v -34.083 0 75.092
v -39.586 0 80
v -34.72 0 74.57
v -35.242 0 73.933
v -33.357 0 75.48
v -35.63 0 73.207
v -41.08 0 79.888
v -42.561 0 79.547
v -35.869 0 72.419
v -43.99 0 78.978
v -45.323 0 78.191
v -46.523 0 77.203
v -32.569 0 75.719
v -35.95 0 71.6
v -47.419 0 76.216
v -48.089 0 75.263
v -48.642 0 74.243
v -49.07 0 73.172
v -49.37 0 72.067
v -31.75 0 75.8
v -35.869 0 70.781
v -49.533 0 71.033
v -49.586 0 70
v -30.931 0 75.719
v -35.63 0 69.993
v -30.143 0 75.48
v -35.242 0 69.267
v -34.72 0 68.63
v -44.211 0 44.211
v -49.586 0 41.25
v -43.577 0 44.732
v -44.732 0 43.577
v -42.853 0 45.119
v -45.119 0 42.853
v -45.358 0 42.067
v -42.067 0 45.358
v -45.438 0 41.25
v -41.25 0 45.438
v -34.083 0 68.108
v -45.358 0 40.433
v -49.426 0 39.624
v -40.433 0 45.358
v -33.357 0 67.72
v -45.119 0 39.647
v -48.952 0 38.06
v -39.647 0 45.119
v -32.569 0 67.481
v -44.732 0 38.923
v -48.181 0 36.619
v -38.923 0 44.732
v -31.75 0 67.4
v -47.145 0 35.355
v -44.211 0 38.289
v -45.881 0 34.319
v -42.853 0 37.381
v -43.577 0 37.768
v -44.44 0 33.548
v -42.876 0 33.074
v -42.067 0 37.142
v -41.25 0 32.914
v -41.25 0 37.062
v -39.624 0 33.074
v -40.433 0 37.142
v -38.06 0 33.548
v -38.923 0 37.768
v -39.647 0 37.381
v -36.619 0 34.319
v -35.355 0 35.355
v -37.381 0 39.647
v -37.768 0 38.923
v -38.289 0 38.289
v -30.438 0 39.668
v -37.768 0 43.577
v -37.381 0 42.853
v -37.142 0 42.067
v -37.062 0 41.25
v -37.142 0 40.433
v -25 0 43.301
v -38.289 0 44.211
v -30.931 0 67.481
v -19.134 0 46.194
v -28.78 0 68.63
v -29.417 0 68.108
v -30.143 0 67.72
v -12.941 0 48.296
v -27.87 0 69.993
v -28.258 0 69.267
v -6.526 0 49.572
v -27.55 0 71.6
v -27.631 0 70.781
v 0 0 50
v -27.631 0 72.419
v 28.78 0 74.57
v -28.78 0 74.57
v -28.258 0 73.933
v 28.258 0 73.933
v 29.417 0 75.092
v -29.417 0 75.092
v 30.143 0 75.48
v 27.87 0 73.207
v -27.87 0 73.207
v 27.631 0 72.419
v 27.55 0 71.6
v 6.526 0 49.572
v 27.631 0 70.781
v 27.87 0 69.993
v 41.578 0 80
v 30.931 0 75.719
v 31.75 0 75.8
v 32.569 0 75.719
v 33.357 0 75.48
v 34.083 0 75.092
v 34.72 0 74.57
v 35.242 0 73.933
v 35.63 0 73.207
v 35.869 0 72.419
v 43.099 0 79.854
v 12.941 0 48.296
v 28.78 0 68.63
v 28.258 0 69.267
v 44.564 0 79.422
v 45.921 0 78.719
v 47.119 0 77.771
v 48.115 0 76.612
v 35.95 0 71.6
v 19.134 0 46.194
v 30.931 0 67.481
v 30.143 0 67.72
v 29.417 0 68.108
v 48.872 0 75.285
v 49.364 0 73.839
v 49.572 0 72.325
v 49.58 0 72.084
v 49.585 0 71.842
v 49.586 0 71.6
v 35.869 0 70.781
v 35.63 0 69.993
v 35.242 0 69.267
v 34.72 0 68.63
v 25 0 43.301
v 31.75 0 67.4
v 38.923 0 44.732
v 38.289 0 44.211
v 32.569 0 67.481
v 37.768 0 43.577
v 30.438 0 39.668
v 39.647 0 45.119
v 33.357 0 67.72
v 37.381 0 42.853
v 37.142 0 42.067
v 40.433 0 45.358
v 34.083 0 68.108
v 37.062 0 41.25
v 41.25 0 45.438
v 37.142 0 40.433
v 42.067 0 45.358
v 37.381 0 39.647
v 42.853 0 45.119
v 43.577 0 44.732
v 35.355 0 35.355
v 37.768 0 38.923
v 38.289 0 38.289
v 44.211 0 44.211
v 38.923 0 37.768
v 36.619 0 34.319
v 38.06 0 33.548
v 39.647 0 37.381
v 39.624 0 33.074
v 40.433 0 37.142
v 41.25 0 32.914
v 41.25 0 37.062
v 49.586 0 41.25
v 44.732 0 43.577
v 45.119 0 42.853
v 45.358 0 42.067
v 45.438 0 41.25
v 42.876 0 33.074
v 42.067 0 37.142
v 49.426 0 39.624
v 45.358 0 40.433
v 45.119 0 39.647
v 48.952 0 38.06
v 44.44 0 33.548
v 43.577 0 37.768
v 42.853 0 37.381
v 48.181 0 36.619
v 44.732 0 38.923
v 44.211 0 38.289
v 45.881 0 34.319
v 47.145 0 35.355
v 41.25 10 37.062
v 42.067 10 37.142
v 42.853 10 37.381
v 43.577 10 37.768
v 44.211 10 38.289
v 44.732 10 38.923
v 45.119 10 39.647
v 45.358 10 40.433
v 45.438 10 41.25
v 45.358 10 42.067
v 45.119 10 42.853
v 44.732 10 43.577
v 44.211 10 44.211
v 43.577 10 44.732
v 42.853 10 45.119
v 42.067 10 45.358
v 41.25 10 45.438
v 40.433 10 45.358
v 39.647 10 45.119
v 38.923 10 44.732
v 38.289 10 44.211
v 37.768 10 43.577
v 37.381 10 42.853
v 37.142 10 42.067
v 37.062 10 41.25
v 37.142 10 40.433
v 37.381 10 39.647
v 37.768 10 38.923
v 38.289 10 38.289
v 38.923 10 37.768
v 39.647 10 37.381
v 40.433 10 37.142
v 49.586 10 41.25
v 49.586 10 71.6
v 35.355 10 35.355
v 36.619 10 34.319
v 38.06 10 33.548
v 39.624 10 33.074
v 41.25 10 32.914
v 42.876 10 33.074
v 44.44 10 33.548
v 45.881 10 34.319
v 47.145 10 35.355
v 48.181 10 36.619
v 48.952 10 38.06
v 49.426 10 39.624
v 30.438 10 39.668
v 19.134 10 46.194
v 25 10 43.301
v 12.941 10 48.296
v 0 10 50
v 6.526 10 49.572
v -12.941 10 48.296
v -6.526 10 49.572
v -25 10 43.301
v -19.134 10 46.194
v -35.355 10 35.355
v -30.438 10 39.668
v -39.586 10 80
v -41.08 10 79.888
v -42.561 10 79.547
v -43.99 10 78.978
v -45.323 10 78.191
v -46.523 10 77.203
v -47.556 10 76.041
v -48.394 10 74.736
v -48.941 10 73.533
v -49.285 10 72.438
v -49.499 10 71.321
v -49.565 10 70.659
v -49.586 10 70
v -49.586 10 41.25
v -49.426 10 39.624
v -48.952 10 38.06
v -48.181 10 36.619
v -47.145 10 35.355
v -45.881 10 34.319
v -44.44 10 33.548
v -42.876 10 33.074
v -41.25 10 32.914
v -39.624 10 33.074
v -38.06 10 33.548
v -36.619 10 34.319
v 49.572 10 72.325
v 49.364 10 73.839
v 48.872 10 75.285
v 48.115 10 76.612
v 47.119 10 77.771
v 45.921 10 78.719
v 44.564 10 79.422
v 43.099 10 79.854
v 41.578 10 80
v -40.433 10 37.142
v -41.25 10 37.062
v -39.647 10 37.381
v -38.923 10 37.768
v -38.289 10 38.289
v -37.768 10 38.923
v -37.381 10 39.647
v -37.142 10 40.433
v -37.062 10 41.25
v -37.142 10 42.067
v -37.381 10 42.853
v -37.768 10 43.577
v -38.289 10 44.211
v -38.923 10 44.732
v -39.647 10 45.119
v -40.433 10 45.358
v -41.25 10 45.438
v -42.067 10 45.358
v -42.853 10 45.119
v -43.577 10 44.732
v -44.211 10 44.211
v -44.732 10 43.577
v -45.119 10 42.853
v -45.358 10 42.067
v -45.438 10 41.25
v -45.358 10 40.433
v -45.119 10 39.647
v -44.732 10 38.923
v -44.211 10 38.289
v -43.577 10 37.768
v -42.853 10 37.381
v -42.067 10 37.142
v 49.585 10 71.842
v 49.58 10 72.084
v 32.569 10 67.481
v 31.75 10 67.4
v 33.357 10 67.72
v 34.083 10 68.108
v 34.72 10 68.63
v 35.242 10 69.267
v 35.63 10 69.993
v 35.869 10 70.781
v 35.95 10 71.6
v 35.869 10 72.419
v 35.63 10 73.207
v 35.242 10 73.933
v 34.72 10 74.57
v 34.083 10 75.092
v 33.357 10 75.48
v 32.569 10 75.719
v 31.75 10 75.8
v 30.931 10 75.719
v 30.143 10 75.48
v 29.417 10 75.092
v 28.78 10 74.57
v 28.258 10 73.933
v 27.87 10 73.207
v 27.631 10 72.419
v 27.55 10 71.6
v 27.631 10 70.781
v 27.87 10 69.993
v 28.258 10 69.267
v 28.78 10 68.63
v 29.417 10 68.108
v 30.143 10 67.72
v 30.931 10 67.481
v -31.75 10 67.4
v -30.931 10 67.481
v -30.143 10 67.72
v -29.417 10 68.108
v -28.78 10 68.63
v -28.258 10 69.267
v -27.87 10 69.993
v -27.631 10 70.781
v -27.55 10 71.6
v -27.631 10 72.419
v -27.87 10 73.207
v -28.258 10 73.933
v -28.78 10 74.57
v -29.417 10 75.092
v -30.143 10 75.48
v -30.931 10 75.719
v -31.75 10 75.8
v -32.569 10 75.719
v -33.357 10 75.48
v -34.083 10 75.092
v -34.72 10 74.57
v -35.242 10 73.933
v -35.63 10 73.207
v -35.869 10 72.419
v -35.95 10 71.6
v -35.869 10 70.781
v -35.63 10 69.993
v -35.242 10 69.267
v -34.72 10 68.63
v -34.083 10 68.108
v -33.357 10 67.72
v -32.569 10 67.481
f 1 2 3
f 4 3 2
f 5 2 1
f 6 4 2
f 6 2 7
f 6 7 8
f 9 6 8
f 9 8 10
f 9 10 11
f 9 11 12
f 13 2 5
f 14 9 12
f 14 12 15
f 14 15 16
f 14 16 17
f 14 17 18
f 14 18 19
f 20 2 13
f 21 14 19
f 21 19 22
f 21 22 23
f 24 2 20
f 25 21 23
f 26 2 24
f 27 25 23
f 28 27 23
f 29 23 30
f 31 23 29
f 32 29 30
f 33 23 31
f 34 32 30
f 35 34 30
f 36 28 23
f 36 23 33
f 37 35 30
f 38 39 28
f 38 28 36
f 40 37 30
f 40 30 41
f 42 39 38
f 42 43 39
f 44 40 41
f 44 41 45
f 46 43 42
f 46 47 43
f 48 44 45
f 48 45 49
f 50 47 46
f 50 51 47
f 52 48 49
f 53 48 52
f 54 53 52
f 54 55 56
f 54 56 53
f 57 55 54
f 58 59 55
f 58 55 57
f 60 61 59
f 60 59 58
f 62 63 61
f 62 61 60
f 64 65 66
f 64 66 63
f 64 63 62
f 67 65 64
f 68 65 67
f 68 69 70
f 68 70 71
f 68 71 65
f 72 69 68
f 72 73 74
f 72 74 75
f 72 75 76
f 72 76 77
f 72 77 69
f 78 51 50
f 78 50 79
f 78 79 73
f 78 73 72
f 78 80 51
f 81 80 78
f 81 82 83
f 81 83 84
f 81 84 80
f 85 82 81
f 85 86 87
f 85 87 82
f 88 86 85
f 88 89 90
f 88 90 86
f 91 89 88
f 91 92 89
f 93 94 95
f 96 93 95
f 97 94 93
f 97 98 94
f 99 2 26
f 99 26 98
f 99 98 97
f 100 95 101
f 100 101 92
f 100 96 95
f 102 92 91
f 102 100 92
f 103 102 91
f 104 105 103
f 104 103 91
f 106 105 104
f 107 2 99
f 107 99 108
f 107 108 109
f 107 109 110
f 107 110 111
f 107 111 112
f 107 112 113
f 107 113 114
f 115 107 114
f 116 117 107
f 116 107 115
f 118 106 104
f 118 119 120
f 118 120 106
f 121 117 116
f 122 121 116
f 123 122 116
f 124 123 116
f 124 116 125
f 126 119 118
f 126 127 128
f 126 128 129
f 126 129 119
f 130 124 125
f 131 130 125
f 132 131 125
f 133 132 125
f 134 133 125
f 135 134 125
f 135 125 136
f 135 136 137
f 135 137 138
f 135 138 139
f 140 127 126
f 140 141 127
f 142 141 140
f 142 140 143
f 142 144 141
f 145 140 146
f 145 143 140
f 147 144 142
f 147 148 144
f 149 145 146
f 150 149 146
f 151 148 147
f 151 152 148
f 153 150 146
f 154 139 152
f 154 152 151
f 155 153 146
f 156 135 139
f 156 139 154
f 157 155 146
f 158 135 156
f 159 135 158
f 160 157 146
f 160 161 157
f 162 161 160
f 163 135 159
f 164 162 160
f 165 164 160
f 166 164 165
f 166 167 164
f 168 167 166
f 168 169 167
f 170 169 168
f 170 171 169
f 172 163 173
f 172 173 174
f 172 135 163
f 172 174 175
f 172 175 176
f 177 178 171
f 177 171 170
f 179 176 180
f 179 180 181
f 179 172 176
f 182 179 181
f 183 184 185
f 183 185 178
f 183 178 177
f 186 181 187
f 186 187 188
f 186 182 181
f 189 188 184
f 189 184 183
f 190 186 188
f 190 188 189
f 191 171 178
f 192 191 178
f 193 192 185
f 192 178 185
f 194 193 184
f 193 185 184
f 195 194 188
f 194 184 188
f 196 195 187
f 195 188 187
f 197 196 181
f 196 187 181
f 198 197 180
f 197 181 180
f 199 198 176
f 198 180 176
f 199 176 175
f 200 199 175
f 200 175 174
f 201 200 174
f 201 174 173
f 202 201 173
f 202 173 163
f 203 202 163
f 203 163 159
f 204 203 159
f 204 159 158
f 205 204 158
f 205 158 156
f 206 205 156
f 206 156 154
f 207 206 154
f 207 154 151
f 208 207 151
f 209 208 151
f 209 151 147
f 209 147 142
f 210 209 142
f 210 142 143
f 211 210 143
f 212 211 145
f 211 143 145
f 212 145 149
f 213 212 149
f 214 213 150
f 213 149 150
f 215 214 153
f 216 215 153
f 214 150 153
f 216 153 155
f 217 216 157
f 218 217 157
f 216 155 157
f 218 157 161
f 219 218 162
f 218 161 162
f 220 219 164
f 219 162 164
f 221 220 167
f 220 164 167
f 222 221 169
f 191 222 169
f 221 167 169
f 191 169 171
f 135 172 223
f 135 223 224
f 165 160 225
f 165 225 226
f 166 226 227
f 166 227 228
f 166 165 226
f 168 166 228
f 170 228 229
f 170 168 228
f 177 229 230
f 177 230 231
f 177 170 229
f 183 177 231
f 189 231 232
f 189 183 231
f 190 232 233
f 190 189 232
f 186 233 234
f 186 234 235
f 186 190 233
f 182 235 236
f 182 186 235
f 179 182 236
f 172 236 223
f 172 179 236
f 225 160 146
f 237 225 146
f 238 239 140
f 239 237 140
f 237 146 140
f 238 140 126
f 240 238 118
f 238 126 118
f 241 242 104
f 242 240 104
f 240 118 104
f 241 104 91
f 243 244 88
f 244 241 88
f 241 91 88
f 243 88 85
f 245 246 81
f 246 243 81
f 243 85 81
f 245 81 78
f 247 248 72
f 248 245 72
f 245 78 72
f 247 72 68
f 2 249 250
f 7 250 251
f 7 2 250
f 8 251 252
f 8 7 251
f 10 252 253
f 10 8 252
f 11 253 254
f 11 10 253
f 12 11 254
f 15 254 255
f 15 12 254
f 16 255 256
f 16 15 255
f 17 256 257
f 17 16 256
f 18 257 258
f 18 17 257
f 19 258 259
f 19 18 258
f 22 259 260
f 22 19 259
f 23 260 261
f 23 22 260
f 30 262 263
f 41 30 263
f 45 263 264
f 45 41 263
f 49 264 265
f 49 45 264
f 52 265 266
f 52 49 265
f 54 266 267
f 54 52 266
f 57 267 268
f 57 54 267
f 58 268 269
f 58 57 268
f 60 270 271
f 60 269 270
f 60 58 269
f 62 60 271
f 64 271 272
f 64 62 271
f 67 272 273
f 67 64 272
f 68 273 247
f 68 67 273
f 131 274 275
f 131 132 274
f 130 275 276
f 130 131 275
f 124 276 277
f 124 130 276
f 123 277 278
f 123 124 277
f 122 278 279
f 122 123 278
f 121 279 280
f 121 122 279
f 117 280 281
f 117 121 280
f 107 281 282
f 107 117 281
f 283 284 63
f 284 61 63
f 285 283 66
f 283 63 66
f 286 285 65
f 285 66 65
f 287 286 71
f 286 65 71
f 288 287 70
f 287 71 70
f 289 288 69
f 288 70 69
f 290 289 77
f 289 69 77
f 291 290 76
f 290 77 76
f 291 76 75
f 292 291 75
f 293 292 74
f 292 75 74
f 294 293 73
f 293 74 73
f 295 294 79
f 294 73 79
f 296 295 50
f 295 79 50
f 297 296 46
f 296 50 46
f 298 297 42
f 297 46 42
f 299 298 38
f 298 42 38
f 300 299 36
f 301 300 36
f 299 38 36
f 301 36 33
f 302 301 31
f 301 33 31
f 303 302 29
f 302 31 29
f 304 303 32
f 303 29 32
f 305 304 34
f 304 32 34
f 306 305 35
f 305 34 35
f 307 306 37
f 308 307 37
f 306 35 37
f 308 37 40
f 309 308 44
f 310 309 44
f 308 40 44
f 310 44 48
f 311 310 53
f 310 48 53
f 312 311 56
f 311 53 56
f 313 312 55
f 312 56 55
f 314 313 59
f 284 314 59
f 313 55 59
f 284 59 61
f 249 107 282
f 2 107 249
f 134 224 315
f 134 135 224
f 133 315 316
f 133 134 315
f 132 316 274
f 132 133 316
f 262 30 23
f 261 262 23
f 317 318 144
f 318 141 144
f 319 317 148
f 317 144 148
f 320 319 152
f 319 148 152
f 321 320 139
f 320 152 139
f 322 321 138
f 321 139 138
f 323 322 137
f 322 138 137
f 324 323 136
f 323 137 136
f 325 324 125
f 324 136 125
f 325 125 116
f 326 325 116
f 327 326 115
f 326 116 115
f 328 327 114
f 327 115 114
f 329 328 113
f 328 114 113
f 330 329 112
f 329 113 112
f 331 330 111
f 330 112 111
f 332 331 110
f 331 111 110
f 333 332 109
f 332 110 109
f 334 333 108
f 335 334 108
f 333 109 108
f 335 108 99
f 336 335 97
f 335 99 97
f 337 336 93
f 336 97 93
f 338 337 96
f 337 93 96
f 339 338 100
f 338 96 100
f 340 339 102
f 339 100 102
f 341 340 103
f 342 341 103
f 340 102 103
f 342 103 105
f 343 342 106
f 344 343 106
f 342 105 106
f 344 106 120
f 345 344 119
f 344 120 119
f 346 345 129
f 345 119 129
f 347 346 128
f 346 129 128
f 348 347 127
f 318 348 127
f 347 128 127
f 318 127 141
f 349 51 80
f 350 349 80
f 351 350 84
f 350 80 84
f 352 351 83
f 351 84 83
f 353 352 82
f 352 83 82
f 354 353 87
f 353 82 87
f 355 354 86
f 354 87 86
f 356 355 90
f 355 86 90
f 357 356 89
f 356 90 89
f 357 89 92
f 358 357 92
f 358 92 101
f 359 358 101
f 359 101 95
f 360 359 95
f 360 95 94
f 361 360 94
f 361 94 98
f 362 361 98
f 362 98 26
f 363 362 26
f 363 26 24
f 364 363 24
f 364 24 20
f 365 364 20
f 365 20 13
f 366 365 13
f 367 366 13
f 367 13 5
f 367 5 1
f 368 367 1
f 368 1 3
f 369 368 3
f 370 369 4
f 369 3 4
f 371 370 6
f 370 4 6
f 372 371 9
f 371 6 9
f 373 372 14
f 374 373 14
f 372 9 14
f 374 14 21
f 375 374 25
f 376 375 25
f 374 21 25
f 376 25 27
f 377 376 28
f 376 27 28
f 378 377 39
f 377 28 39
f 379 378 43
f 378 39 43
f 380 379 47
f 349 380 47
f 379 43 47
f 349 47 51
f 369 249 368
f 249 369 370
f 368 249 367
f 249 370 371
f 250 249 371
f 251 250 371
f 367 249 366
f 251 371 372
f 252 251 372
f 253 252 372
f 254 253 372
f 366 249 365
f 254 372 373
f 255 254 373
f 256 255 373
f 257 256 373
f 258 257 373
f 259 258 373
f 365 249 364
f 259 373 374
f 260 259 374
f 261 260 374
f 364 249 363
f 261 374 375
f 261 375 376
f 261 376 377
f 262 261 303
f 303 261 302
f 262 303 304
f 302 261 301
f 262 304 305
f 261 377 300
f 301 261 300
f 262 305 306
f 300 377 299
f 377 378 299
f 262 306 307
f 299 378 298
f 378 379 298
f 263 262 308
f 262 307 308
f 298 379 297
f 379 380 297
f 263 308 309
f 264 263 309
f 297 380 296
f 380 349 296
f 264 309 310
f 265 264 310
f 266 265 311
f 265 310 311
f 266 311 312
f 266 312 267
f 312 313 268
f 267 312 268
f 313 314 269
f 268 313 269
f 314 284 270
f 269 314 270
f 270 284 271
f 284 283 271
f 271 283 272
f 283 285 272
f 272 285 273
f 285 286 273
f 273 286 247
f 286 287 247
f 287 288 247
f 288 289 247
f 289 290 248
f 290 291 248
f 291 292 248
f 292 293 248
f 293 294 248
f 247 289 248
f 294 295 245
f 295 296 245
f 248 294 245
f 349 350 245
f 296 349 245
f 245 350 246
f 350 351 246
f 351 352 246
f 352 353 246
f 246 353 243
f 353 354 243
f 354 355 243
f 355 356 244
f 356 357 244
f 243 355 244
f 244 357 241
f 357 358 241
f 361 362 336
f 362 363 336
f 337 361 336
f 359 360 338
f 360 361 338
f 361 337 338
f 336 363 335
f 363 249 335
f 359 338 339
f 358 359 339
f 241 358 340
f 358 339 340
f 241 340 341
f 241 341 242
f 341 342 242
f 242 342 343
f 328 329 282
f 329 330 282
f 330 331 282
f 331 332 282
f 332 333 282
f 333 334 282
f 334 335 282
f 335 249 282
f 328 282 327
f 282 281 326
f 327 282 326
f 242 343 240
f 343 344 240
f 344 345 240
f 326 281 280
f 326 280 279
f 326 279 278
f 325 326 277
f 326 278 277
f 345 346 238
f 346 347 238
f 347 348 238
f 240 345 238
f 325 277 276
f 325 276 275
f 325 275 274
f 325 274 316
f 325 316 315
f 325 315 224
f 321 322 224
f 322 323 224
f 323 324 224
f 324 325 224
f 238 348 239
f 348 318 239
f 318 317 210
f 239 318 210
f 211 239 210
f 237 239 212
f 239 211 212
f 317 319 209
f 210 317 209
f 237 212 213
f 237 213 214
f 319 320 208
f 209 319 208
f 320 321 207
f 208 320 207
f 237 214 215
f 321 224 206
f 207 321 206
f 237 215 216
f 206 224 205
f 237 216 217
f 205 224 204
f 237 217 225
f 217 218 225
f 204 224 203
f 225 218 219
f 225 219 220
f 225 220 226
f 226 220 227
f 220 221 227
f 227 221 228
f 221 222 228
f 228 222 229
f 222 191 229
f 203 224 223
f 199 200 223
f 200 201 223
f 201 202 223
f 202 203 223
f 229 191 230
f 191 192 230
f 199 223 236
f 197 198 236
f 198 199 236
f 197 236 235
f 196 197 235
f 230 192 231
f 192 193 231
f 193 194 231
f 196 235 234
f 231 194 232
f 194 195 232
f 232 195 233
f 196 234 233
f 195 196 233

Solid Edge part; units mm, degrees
sketch "Sketch1" plane through (0, 0, 0) normal (0, -1, 0) x (1, 0, 0)
  arc A0 (-35.3553, 35.3553) -> (35.3553, 35.3553) centre (0, 0) cw
  arc A1 (35.3553, 35.3553) -> (49.5863, 41.25) centre (41.25, 41.25) ccw
  line L0 (49.5863, 41.25) -> (49.5863, 71.6)
  arc A2 (49.5863, 71.6) -> (31.75, 89.4363) centre (31.75, 71.6) ccw
  line L1 (-31.75, 89.4363) -> (31.75, 89.4363)
  arc A3 (-49.5863, 71.6) -> (-31.75, 89.4363) centre (-31.75, 71.6) cw
  line L2 (-49.5863, 41.25) -> (-49.5863, 71.6)
  arc A4 (-35.3553, 35.3553) -> (-49.5863, 41.25) centre (-41.25, 41.25) cw
  dimension "D1" = 50
  dimension "D2" = 30.35
  dimension "D3" = 30.35
extrude "Protrusion1" add sketch "Sketch1" against normal blind 10
thread "Thread1" [suppressed]
thread "Thread2" [suppressed]
hole "Hole_1" at (-31.75, 0, 71.6) direction (0, 1, 0) diameter 8.4 end up to next
hole "Hole1" at (31.75, 0, 71.6) direction (0, 1, 0) diameter 8.4 end up to next
sketch "Sketch2" plane through (0, 0, 61.425) normal (0, -1, 0) x (1, 0, 0)
  line L0 (-83.4503, 18.575) -> (83.4503, 18.575)
  dimension "D1" = 80
  dimension "D2" = 166.9006
extrude "ExtrudedCutout_1" cut sketch "Sketch2" against normal blind 30.8448 and the other way blind 163.4824 material side at (0, 0, 80.05)
fillet "Round_1" radius 8 1 edges at (47.4845, 5, 80)
fillet "Round_2" radius 10 1 edges at (-47.4845, 5, 80)
hole "Hole_3" at (-41.25, 0, 41.25) direction (0, 1, 0) diameter 8.376 end up to next thread major 10 thread length 2
hole "Hole2" at (41.25, 0, 41.25) direction (0, 1, 0) diameter 8.376 end up to next thread major 10 thread length 2
properties material "Iron, grey cast type 40"
